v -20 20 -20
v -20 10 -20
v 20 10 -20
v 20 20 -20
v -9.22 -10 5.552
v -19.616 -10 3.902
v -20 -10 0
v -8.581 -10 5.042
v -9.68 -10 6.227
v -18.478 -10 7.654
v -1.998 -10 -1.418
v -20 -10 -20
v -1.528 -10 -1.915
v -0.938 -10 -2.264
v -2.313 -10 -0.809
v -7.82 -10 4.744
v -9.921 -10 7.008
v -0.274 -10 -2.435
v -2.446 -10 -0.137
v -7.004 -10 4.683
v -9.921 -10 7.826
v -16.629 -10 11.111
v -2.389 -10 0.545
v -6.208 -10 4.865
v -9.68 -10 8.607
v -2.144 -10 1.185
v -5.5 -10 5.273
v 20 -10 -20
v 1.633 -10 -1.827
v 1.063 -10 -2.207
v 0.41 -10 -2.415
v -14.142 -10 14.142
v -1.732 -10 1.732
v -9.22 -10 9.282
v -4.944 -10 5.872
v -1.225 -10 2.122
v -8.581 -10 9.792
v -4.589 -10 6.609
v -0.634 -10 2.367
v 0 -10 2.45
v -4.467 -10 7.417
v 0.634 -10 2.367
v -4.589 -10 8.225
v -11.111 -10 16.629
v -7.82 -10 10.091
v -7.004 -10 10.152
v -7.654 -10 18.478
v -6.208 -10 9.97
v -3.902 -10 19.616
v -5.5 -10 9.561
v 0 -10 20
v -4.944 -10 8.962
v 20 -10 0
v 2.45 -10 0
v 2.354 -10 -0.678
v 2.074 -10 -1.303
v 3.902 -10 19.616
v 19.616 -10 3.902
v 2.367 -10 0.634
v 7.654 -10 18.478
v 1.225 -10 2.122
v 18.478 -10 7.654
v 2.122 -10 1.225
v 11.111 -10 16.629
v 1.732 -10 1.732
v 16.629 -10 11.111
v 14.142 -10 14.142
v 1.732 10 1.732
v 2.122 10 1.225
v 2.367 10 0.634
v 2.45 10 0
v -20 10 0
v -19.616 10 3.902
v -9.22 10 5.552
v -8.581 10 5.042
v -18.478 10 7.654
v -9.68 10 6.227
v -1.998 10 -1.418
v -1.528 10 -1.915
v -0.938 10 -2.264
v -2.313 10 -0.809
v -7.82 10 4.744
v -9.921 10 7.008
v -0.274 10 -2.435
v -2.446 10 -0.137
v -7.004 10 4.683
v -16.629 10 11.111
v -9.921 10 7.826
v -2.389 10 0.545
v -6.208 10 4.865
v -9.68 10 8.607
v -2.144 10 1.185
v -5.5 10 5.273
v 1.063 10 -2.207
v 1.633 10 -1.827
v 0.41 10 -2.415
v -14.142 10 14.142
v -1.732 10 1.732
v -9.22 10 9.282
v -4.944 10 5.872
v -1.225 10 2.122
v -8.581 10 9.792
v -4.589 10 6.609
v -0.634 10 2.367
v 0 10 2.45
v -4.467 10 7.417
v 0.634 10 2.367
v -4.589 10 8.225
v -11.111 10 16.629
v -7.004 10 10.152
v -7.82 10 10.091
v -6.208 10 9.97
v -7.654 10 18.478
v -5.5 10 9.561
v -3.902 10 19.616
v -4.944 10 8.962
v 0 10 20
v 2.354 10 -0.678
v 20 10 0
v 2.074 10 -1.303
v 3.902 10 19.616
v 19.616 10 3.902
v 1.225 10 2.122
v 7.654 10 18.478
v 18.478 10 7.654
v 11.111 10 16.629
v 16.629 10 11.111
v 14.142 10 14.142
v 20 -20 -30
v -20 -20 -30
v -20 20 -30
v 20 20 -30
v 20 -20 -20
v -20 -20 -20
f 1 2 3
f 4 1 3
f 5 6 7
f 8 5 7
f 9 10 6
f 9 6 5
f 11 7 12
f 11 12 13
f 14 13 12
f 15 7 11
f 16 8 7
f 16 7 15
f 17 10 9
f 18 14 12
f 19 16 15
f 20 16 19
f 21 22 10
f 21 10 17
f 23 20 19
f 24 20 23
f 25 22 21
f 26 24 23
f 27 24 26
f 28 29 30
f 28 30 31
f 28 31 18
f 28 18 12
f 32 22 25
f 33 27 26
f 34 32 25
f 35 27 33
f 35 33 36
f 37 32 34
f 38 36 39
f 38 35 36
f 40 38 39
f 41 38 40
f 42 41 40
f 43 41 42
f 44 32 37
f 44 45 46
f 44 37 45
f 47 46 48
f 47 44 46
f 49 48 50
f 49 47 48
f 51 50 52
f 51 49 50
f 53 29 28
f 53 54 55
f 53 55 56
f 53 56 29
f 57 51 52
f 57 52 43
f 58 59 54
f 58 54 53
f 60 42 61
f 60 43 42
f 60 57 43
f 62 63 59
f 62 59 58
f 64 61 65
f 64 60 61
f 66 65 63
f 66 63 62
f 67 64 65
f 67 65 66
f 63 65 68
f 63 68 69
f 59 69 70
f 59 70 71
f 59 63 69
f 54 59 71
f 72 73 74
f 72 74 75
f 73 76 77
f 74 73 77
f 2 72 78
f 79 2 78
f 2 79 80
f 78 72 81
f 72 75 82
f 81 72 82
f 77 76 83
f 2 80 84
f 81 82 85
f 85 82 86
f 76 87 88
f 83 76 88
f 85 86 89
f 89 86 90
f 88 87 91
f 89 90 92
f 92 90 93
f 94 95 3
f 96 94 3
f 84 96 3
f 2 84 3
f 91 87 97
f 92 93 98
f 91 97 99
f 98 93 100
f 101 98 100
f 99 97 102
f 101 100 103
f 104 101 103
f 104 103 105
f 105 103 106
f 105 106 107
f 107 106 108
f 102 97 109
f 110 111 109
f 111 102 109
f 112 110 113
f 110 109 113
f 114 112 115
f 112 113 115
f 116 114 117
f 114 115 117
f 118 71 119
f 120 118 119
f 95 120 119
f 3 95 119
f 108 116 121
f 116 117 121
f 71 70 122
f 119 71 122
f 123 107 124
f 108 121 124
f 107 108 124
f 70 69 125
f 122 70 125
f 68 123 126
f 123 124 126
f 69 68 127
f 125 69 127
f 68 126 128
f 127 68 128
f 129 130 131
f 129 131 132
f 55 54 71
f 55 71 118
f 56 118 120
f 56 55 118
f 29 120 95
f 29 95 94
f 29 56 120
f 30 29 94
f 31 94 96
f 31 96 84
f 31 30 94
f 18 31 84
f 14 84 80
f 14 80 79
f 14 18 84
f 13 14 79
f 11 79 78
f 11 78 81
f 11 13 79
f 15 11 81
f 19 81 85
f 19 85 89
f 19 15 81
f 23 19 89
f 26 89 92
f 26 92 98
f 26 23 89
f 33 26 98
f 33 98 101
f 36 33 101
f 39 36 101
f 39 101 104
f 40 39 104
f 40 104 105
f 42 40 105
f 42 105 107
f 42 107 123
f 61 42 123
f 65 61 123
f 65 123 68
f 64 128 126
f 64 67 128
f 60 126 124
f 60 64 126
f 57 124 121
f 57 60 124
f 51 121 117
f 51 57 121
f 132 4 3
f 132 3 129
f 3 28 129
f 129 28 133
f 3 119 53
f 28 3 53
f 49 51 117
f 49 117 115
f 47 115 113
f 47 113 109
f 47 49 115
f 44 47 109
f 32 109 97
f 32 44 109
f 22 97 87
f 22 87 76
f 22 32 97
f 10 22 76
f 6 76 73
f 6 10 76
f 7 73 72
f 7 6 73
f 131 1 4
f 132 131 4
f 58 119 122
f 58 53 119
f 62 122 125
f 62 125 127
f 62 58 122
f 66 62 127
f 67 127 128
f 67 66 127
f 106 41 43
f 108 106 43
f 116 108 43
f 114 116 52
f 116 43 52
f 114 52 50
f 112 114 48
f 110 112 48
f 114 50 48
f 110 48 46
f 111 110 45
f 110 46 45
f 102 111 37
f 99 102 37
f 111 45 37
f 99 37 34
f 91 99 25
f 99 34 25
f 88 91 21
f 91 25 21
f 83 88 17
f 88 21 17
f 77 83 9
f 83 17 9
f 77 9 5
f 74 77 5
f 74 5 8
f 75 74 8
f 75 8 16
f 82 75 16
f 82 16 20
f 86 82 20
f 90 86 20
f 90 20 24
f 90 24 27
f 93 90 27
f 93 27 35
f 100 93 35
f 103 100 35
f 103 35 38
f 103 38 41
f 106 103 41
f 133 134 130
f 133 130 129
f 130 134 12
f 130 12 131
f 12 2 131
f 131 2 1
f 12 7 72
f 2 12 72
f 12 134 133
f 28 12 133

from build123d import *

# Parameters (mm, degrees)
F1_DEPTH = 10
F2_R     = 2.742204369
F3_DEPTH = 25
F4_W     = 40
F4_H     = 10
F4_H_2   = 20
F5_DEPTH = 10


with BuildPart() as f1:
    # F0 (on Front) → F1 (new body, symmetric)
    with BuildSketch(Plane.XZ):
        with BuildLine():
            Line((1.7324116139, 1.7324116139), (14.1421356237, 14.1421356237))
            ThreePointArc((14.1421356237, 14.1421356237), (7.6536686307, 18.4775906571), (-3.59e-08, 20))
            ThreePointArc((-3.59e-08, 20), (-7.6536686639, 18.4775906433), (-14.1421356237, 14.1421356237))
            Line((-14.1421356237, 14.1421356237), (-1.7324116139, 1.7324116139))
            ThreePointArc((-1.7324116139, 1.7324116139), (0, 2.45), (1.7324116139, 1.7324116139))
        make_face()
        with BuildLine():
            ThreePointArc((-20, 0), (-14.1421356237, -14.1421356237), (0, -20))
            ThreePointArc((0, -20), (14.1421356237, -14.1421356237), (20, 0))
            ThreePointArc((20, 0), (18.4775906502, 7.6536686473), (14.1421356237, 14.1421356237))
            Line((14.1421356237, 14.1421356237), (1.7324116139, 1.7324116139))
            ThreePointArc((1.7324116139, 1.7324116139), (2.2635048547, 0.9375744093), (2.45, 0))
            ThreePointArc((2.45, 0), (-0.9375744093, -2.2635048547), (-1.7324116139, 1.7324116139))
            Line((-1.7324116139, 1.7324116139), (-14.1421356237, 14.1421356237))
            ThreePointArc((-14.1421356237, 14.1421356237), (-18.4775906502, 7.6536686473), (-20, 0))
        make_face()
        with BuildLine():
            Line((-20, -20), (0, -20))
            ThreePointArc((0, -20), (-14.1421356237, -14.1421356237), (-20, 0))
            Line((-20, 0), (-20, -20))
        make_face()
        with BuildLine():
            Line((0, -20), (20, -20))
            Line((20, -20), (20, 0))
            ThreePointArc((20, 0), (14.1421356237, -14.1421356237), (0, -20))
        make_face()
    extrude(amount=F1_DEPTH, both=True)

    # F2 (on face) → F3 (cut)
    with BuildSketch(Plane.XZ.offset(10)):
        with Locations((-7.2094062343, 7.4171875603)):
            Circle(F2_R)
    extrude(amount=-F3_DEPTH, mode=Mode.SUBTRACT)

    # F4 (on face) → F5 (join)
    with BuildSketch(Plane(origin=(0, 0, -20), x_dir=(1, 0, 0), z_dir=(0, 0, -1))):
        with Locations((0, 15)):
            Rectangle(F4_W, F4_H)
        Rectangle(F4_W, F4_H_2)
        with Locations((0, -15)):
            Rectangle(F4_W, F4_H)
    extrude(amount=F5_DEPTH)


solid = f1.part
